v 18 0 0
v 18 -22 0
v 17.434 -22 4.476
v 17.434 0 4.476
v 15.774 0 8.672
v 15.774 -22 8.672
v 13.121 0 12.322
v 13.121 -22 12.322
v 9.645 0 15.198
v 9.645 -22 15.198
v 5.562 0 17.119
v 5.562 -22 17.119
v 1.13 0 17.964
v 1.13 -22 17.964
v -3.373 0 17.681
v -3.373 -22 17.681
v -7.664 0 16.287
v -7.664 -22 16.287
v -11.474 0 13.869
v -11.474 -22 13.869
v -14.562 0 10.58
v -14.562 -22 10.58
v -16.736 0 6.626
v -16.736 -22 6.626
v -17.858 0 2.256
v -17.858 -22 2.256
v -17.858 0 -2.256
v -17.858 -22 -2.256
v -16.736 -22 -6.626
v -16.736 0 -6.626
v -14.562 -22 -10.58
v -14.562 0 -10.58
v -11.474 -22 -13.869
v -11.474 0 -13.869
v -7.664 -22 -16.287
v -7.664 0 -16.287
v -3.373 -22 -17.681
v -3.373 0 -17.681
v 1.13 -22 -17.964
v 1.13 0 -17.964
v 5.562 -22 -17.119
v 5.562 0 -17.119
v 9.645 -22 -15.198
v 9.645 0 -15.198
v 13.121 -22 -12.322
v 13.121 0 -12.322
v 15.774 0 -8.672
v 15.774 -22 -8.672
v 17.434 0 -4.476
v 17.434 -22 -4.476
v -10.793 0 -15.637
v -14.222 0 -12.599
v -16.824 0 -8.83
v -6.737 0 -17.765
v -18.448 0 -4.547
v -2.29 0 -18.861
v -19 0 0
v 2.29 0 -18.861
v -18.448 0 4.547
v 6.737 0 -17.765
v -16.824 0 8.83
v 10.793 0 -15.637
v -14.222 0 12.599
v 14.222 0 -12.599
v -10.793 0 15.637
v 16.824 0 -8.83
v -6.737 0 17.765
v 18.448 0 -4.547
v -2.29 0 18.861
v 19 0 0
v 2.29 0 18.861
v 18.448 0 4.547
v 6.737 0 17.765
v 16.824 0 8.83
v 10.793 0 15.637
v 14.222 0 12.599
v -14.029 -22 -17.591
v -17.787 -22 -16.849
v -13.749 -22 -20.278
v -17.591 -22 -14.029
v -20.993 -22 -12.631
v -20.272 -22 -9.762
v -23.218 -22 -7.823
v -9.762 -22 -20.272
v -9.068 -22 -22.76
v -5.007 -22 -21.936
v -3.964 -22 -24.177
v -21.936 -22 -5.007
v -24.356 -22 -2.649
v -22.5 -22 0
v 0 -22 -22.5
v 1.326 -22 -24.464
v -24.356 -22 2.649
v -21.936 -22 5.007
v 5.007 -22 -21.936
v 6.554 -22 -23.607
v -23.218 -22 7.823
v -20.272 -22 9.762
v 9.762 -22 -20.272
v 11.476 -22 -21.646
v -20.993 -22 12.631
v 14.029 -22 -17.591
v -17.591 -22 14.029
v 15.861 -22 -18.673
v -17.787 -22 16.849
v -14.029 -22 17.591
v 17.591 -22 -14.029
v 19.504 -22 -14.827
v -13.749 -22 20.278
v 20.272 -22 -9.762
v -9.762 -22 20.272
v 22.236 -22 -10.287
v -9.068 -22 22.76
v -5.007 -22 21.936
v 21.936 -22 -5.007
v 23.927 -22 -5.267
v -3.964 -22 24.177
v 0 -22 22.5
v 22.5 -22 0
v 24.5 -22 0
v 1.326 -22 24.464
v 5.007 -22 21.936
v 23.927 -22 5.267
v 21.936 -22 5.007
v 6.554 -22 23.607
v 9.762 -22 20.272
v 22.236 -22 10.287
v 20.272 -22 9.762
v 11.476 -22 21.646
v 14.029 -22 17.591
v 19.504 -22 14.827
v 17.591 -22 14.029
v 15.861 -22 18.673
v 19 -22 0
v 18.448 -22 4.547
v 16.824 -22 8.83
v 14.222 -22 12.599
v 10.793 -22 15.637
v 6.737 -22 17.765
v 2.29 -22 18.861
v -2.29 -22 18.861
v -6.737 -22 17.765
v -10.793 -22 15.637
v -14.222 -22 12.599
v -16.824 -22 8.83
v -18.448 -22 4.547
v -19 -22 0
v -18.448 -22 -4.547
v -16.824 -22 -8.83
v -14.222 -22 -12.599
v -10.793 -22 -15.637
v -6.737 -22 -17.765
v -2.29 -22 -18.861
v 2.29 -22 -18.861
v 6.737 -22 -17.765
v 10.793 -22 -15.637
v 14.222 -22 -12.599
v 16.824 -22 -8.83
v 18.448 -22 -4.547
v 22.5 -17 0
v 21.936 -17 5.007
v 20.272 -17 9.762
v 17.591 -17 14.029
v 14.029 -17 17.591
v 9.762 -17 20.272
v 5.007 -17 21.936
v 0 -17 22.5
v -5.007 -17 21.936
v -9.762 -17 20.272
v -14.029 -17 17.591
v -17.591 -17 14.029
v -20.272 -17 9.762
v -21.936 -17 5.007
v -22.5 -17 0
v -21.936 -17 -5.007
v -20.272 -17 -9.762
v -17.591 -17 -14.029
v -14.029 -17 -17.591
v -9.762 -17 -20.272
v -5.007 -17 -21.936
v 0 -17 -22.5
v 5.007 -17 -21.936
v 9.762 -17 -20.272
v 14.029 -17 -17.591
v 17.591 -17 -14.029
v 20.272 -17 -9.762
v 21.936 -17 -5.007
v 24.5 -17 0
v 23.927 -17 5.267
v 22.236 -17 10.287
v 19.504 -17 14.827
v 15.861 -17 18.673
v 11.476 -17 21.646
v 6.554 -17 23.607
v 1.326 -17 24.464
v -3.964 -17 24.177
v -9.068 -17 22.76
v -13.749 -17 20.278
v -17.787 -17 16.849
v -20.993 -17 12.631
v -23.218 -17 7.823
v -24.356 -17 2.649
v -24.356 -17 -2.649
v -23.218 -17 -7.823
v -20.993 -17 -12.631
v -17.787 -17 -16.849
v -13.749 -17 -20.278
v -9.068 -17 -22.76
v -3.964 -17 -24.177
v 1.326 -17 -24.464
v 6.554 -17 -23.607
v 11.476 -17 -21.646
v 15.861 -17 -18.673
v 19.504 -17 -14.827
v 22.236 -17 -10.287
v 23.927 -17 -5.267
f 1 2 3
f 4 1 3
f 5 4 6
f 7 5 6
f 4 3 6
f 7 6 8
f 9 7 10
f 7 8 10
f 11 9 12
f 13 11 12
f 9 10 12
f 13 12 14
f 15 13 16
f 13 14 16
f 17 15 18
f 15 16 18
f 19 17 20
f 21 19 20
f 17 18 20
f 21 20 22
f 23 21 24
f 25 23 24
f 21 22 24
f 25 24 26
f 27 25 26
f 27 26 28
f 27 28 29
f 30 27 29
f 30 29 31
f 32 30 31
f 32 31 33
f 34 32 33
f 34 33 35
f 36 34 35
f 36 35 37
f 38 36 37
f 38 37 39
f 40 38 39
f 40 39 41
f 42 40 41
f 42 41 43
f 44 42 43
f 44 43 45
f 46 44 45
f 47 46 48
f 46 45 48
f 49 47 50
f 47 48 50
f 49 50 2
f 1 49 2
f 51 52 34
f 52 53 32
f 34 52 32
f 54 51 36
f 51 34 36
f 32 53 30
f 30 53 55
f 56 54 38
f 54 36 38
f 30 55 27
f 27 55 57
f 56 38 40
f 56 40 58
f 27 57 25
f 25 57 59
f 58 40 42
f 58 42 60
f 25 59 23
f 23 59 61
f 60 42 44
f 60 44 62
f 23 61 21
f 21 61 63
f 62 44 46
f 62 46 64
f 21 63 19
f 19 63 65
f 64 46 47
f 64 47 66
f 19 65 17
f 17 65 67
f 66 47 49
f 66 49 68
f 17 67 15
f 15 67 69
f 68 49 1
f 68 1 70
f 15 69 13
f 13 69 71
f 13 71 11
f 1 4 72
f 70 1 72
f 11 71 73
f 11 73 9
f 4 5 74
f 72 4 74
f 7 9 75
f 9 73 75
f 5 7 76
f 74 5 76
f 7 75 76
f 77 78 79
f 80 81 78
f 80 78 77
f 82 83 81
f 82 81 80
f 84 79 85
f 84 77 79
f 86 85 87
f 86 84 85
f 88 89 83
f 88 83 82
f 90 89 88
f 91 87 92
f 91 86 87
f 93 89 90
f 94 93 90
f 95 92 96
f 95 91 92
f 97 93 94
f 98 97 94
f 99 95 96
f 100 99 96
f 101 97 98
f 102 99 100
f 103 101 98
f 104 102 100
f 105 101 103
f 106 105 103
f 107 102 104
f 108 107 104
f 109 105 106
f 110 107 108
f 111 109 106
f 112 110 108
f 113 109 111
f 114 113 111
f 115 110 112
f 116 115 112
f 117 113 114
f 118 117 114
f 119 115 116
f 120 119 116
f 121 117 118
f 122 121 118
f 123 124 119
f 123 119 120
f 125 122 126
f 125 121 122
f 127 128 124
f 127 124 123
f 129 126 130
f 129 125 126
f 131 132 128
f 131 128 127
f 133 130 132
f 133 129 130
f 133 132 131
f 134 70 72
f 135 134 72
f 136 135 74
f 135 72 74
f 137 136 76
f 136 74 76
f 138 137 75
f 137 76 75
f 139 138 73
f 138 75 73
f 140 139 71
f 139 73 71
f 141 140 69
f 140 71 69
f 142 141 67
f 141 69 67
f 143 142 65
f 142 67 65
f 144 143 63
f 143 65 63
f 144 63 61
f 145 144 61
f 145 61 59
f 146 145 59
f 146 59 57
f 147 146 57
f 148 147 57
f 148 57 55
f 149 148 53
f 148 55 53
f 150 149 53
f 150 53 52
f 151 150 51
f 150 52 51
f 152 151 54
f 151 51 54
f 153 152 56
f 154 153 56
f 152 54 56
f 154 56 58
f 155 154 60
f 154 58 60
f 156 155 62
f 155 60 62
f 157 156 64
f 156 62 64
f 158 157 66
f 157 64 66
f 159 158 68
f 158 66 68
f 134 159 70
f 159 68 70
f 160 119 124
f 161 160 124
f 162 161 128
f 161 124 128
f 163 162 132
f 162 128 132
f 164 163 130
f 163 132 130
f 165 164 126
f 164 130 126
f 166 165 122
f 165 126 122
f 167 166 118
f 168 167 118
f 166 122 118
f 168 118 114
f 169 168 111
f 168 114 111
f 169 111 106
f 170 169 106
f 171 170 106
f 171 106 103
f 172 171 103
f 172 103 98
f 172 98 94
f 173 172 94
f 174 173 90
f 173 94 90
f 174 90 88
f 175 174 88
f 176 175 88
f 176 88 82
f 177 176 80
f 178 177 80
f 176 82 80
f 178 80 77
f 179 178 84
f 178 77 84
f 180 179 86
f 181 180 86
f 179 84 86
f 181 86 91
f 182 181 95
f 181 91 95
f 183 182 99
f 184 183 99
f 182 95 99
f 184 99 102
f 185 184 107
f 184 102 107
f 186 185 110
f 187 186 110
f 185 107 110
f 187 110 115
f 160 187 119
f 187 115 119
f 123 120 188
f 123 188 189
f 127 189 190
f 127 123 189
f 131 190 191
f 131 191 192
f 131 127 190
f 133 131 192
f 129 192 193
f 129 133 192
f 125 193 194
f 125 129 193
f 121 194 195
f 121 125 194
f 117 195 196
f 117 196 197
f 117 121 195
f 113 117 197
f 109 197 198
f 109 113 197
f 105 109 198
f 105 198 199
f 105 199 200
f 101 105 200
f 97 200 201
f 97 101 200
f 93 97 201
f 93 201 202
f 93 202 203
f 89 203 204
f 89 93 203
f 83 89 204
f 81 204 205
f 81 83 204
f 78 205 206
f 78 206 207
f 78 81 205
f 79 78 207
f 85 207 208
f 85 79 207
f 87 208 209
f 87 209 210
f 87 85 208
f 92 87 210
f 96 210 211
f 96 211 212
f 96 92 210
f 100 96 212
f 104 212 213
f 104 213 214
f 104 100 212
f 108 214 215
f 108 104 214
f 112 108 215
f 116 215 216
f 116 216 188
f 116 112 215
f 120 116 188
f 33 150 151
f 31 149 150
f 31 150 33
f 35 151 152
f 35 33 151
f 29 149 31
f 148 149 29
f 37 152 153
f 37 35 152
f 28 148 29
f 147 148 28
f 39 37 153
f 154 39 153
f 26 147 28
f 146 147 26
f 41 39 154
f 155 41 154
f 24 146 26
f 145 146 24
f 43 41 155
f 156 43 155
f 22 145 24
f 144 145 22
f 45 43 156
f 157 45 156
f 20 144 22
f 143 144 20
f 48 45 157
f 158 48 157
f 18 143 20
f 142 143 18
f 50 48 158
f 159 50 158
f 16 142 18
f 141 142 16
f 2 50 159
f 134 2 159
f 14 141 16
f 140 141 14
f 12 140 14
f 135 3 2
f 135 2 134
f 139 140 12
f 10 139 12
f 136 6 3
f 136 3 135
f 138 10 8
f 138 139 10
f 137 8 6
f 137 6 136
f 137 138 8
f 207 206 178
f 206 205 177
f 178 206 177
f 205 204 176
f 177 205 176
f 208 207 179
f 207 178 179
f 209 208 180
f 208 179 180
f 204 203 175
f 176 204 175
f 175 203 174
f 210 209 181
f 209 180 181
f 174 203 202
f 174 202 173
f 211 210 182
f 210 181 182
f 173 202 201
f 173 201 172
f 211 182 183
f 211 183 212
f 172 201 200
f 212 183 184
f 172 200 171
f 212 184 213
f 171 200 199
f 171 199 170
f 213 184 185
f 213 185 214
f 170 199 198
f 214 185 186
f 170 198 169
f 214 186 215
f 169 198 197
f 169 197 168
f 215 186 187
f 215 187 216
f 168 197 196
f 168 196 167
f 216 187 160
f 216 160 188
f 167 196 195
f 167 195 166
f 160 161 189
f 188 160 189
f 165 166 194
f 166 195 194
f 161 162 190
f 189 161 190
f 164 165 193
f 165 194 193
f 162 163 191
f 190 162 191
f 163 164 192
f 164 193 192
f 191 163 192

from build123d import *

# Parameters (mm, degrees)
F0_R     = 19
F1_DEPTH = 22
F2_R     = 18
F3_DEPTH = 22.001
F4_R     = 24.5
F4_R_2   = 22.5
F5_DEPTH = 5


with BuildPart() as f1:
    # F0 (on Front) → F1 (new body)
    with BuildSketch(Plane.XZ):
        Circle(F0_R)
    extrude(amount=F1_DEPTH)

    # F2 (on face) → F3 (cut, through all)
    with BuildSketch(Plane.XZ.offset(22)):
        Circle(F2_R)
    extrude(amount=-F3_DEPTH, mode=Mode.SUBTRACT)


with BuildPart() as f5:
    # F4 (on face) → F5 (new body)
    with BuildSketch(Plane.XZ.offset(22)):
        Circle(F4_R)
        Circle(F4_R_2, mode=Mode.SUBTRACT)
    extrude(amount=-F5_DEPTH)


solid = Compound([f1.part, f5.part])
